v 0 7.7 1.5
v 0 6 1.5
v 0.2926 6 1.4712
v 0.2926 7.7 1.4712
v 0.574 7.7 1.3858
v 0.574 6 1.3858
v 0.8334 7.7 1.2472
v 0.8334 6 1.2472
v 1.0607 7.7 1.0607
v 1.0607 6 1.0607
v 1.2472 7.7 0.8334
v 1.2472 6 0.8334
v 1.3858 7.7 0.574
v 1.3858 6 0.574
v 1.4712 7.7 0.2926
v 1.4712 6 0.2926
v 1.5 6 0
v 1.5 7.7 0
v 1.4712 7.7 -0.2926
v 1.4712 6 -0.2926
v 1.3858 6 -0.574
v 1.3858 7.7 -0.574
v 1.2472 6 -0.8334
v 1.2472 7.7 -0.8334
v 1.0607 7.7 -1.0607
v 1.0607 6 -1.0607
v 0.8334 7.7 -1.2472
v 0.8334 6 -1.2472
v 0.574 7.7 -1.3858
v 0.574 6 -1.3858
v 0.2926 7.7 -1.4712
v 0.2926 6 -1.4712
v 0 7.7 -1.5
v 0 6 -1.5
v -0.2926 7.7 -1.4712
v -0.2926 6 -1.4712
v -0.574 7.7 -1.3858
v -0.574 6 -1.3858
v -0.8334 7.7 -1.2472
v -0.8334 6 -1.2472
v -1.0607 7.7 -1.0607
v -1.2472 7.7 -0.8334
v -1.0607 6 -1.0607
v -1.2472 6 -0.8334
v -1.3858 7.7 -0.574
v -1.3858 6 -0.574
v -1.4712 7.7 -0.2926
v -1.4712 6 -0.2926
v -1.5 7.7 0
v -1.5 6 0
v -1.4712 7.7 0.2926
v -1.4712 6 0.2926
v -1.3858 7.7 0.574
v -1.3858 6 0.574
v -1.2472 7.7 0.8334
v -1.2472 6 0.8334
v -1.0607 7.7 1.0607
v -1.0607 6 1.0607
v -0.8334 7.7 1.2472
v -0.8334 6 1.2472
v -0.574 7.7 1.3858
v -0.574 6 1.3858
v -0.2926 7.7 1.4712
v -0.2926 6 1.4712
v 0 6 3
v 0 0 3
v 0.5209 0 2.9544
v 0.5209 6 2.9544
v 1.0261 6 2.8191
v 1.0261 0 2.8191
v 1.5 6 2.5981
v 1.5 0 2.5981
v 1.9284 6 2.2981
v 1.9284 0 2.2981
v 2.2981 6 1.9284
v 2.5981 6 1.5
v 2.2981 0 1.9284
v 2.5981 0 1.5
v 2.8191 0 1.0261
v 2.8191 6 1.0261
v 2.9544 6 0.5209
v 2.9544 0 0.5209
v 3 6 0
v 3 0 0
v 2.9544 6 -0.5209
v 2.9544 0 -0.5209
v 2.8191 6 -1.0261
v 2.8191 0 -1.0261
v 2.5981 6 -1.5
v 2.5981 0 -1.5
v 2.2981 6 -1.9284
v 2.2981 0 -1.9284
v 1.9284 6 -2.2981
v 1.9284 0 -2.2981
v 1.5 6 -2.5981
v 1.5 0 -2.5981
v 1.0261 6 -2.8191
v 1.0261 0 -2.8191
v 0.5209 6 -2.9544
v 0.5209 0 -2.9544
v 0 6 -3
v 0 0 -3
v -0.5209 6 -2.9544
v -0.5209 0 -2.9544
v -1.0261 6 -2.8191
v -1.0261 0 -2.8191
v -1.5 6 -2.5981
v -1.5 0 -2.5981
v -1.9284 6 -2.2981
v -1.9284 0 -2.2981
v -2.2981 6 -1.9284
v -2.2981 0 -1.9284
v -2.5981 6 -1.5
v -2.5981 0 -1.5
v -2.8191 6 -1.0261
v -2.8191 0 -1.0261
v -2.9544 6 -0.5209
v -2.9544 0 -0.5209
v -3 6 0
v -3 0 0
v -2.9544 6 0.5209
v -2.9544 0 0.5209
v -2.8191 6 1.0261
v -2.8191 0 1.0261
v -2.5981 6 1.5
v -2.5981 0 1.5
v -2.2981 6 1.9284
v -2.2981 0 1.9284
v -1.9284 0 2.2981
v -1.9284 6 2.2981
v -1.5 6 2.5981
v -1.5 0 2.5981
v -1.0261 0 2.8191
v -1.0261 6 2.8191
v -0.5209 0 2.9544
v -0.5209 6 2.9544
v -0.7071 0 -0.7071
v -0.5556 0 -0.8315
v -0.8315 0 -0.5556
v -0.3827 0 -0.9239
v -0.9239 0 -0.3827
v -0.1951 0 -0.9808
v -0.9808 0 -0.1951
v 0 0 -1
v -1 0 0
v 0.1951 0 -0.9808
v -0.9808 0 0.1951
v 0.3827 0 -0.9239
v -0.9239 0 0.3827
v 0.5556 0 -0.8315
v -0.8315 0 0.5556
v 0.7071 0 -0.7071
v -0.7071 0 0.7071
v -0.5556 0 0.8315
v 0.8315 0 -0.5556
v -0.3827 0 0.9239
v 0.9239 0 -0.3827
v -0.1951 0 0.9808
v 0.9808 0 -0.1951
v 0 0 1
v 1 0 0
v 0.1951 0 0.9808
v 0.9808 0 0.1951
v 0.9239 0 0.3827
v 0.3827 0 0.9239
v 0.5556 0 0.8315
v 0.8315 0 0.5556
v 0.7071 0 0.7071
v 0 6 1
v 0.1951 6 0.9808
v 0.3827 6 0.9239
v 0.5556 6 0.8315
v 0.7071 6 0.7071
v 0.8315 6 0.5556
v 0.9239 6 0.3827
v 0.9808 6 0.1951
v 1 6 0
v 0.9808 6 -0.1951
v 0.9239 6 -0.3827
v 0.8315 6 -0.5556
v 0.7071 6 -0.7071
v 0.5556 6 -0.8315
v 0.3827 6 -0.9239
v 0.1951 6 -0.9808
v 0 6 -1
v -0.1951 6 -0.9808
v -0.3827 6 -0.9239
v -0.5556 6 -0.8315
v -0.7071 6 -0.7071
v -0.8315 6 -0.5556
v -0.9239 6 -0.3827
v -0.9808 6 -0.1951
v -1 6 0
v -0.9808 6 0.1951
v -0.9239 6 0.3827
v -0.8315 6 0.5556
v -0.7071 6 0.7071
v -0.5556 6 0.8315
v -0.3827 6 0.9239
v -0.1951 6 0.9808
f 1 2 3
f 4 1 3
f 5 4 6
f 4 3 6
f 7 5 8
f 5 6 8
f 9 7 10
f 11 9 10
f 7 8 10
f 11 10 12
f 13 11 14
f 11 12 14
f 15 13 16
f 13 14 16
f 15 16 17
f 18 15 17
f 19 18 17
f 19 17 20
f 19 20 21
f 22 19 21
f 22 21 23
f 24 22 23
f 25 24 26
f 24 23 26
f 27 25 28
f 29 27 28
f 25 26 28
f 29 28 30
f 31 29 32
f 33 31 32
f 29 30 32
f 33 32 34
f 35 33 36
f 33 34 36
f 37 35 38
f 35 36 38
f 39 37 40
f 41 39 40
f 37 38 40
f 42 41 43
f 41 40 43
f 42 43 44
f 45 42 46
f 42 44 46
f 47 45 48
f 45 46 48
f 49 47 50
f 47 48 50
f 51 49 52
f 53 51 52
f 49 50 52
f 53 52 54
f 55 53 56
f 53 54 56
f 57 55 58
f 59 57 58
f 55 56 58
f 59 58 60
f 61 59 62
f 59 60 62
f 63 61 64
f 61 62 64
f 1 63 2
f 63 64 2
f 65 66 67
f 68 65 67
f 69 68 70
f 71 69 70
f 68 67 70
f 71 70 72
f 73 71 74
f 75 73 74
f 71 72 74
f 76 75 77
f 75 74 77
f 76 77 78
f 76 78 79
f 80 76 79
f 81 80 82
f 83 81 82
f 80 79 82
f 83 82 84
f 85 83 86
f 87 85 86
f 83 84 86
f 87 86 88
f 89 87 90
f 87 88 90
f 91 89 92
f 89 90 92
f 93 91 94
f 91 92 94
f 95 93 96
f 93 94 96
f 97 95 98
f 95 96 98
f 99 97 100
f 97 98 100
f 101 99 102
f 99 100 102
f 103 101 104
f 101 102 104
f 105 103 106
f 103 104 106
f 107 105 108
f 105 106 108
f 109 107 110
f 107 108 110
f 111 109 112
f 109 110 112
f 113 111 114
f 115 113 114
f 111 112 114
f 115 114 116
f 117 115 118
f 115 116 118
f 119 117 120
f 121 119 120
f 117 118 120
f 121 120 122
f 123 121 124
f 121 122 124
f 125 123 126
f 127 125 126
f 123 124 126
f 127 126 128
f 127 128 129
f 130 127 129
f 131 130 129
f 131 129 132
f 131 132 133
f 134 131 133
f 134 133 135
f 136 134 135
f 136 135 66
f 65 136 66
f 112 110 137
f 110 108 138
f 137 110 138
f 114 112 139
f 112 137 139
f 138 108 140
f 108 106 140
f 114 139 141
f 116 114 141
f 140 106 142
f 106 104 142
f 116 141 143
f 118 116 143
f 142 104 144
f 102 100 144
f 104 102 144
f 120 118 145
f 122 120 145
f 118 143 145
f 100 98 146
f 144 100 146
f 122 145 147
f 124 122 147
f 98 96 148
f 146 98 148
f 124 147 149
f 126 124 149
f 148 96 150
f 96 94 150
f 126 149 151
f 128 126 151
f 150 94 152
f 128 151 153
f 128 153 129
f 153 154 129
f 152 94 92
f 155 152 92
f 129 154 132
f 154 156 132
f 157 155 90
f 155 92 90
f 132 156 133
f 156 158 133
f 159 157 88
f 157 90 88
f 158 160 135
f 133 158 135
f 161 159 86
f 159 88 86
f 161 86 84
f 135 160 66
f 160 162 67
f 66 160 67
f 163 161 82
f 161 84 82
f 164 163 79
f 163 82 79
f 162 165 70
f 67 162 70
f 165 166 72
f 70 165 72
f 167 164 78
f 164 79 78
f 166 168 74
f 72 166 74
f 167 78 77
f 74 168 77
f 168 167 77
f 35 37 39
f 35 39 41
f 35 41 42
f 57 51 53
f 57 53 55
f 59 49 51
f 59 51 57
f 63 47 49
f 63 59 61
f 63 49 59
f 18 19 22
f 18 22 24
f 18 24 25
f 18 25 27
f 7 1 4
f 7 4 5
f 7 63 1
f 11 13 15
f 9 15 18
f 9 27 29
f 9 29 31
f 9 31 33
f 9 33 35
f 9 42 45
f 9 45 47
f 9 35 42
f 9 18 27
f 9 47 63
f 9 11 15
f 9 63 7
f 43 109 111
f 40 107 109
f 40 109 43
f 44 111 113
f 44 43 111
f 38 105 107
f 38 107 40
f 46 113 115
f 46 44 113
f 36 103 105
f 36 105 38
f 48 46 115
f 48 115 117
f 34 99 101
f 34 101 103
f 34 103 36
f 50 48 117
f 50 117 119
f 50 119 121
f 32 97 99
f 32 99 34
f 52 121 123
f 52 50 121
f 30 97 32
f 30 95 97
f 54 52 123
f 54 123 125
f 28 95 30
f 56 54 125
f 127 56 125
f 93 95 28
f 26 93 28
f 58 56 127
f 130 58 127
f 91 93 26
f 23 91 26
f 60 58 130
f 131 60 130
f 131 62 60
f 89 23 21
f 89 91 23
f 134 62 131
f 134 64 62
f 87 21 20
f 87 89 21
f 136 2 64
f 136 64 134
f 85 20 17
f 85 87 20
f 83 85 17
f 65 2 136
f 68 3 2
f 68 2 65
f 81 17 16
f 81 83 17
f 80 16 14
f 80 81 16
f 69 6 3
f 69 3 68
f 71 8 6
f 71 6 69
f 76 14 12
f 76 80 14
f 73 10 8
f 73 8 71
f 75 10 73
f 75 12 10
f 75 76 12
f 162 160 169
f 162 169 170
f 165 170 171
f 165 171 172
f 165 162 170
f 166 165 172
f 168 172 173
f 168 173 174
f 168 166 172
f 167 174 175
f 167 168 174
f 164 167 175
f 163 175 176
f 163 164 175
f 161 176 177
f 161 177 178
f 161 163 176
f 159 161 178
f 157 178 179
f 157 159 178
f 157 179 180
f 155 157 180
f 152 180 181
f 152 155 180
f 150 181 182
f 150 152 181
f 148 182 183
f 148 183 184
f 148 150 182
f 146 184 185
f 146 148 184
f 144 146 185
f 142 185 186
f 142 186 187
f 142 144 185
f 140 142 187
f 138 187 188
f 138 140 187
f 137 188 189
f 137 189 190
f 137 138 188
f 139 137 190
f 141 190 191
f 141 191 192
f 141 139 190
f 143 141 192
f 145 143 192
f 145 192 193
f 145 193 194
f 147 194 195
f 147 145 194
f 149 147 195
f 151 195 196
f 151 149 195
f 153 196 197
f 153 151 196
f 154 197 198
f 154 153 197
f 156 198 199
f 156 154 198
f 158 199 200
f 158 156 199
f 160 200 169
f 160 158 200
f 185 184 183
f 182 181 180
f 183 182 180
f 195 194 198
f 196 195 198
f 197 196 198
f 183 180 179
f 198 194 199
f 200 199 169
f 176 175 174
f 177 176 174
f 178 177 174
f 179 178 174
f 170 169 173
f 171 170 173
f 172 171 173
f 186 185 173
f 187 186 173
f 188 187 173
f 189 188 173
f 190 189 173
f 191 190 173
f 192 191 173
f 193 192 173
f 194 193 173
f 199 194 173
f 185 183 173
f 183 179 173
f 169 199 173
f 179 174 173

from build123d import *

# Parameters (mm, degrees)
SKETCH2_R           = 3
SKETCH2_R_2         = 1
BOSS_EXTRUDE1_DEPTH = 6
SKETCH3_R           = 1.5
BOSS_EXTRUDE2_DEPTH = 1.7


with BuildPart() as part:
    # Sketch2 → Boss-Extrude1 (new body)
    with BuildSketch(Plane(origin=(0, 0, 0), x_dir=(1, 0, 0), z_dir=(0, 1, 0))):
        with Locations(Location((0, 0, 0), (0, 0, 270))):
            Circle(SKETCH2_R)
        with Locations(Location((0, 0, 0), (0, 0, 270))):
            Circle(SKETCH2_R_2, mode=Mode.SUBTRACT)
    extrude(amount=BOSS_EXTRUDE1_DEPTH)

    # Sketch3 → Boss-Extrude2 (add)
    with BuildSketch(Plane(origin=(0, 6, 0), x_dir=(1, 0, 0), z_dir=(0, 1, 0))):
        with Locations(Location((0, 0, 0), (0, 0, 270))):
            Circle(SKETCH3_R)
    extrude(amount=BOSS_EXTRUDE2_DEPTH)


solid = part.part
